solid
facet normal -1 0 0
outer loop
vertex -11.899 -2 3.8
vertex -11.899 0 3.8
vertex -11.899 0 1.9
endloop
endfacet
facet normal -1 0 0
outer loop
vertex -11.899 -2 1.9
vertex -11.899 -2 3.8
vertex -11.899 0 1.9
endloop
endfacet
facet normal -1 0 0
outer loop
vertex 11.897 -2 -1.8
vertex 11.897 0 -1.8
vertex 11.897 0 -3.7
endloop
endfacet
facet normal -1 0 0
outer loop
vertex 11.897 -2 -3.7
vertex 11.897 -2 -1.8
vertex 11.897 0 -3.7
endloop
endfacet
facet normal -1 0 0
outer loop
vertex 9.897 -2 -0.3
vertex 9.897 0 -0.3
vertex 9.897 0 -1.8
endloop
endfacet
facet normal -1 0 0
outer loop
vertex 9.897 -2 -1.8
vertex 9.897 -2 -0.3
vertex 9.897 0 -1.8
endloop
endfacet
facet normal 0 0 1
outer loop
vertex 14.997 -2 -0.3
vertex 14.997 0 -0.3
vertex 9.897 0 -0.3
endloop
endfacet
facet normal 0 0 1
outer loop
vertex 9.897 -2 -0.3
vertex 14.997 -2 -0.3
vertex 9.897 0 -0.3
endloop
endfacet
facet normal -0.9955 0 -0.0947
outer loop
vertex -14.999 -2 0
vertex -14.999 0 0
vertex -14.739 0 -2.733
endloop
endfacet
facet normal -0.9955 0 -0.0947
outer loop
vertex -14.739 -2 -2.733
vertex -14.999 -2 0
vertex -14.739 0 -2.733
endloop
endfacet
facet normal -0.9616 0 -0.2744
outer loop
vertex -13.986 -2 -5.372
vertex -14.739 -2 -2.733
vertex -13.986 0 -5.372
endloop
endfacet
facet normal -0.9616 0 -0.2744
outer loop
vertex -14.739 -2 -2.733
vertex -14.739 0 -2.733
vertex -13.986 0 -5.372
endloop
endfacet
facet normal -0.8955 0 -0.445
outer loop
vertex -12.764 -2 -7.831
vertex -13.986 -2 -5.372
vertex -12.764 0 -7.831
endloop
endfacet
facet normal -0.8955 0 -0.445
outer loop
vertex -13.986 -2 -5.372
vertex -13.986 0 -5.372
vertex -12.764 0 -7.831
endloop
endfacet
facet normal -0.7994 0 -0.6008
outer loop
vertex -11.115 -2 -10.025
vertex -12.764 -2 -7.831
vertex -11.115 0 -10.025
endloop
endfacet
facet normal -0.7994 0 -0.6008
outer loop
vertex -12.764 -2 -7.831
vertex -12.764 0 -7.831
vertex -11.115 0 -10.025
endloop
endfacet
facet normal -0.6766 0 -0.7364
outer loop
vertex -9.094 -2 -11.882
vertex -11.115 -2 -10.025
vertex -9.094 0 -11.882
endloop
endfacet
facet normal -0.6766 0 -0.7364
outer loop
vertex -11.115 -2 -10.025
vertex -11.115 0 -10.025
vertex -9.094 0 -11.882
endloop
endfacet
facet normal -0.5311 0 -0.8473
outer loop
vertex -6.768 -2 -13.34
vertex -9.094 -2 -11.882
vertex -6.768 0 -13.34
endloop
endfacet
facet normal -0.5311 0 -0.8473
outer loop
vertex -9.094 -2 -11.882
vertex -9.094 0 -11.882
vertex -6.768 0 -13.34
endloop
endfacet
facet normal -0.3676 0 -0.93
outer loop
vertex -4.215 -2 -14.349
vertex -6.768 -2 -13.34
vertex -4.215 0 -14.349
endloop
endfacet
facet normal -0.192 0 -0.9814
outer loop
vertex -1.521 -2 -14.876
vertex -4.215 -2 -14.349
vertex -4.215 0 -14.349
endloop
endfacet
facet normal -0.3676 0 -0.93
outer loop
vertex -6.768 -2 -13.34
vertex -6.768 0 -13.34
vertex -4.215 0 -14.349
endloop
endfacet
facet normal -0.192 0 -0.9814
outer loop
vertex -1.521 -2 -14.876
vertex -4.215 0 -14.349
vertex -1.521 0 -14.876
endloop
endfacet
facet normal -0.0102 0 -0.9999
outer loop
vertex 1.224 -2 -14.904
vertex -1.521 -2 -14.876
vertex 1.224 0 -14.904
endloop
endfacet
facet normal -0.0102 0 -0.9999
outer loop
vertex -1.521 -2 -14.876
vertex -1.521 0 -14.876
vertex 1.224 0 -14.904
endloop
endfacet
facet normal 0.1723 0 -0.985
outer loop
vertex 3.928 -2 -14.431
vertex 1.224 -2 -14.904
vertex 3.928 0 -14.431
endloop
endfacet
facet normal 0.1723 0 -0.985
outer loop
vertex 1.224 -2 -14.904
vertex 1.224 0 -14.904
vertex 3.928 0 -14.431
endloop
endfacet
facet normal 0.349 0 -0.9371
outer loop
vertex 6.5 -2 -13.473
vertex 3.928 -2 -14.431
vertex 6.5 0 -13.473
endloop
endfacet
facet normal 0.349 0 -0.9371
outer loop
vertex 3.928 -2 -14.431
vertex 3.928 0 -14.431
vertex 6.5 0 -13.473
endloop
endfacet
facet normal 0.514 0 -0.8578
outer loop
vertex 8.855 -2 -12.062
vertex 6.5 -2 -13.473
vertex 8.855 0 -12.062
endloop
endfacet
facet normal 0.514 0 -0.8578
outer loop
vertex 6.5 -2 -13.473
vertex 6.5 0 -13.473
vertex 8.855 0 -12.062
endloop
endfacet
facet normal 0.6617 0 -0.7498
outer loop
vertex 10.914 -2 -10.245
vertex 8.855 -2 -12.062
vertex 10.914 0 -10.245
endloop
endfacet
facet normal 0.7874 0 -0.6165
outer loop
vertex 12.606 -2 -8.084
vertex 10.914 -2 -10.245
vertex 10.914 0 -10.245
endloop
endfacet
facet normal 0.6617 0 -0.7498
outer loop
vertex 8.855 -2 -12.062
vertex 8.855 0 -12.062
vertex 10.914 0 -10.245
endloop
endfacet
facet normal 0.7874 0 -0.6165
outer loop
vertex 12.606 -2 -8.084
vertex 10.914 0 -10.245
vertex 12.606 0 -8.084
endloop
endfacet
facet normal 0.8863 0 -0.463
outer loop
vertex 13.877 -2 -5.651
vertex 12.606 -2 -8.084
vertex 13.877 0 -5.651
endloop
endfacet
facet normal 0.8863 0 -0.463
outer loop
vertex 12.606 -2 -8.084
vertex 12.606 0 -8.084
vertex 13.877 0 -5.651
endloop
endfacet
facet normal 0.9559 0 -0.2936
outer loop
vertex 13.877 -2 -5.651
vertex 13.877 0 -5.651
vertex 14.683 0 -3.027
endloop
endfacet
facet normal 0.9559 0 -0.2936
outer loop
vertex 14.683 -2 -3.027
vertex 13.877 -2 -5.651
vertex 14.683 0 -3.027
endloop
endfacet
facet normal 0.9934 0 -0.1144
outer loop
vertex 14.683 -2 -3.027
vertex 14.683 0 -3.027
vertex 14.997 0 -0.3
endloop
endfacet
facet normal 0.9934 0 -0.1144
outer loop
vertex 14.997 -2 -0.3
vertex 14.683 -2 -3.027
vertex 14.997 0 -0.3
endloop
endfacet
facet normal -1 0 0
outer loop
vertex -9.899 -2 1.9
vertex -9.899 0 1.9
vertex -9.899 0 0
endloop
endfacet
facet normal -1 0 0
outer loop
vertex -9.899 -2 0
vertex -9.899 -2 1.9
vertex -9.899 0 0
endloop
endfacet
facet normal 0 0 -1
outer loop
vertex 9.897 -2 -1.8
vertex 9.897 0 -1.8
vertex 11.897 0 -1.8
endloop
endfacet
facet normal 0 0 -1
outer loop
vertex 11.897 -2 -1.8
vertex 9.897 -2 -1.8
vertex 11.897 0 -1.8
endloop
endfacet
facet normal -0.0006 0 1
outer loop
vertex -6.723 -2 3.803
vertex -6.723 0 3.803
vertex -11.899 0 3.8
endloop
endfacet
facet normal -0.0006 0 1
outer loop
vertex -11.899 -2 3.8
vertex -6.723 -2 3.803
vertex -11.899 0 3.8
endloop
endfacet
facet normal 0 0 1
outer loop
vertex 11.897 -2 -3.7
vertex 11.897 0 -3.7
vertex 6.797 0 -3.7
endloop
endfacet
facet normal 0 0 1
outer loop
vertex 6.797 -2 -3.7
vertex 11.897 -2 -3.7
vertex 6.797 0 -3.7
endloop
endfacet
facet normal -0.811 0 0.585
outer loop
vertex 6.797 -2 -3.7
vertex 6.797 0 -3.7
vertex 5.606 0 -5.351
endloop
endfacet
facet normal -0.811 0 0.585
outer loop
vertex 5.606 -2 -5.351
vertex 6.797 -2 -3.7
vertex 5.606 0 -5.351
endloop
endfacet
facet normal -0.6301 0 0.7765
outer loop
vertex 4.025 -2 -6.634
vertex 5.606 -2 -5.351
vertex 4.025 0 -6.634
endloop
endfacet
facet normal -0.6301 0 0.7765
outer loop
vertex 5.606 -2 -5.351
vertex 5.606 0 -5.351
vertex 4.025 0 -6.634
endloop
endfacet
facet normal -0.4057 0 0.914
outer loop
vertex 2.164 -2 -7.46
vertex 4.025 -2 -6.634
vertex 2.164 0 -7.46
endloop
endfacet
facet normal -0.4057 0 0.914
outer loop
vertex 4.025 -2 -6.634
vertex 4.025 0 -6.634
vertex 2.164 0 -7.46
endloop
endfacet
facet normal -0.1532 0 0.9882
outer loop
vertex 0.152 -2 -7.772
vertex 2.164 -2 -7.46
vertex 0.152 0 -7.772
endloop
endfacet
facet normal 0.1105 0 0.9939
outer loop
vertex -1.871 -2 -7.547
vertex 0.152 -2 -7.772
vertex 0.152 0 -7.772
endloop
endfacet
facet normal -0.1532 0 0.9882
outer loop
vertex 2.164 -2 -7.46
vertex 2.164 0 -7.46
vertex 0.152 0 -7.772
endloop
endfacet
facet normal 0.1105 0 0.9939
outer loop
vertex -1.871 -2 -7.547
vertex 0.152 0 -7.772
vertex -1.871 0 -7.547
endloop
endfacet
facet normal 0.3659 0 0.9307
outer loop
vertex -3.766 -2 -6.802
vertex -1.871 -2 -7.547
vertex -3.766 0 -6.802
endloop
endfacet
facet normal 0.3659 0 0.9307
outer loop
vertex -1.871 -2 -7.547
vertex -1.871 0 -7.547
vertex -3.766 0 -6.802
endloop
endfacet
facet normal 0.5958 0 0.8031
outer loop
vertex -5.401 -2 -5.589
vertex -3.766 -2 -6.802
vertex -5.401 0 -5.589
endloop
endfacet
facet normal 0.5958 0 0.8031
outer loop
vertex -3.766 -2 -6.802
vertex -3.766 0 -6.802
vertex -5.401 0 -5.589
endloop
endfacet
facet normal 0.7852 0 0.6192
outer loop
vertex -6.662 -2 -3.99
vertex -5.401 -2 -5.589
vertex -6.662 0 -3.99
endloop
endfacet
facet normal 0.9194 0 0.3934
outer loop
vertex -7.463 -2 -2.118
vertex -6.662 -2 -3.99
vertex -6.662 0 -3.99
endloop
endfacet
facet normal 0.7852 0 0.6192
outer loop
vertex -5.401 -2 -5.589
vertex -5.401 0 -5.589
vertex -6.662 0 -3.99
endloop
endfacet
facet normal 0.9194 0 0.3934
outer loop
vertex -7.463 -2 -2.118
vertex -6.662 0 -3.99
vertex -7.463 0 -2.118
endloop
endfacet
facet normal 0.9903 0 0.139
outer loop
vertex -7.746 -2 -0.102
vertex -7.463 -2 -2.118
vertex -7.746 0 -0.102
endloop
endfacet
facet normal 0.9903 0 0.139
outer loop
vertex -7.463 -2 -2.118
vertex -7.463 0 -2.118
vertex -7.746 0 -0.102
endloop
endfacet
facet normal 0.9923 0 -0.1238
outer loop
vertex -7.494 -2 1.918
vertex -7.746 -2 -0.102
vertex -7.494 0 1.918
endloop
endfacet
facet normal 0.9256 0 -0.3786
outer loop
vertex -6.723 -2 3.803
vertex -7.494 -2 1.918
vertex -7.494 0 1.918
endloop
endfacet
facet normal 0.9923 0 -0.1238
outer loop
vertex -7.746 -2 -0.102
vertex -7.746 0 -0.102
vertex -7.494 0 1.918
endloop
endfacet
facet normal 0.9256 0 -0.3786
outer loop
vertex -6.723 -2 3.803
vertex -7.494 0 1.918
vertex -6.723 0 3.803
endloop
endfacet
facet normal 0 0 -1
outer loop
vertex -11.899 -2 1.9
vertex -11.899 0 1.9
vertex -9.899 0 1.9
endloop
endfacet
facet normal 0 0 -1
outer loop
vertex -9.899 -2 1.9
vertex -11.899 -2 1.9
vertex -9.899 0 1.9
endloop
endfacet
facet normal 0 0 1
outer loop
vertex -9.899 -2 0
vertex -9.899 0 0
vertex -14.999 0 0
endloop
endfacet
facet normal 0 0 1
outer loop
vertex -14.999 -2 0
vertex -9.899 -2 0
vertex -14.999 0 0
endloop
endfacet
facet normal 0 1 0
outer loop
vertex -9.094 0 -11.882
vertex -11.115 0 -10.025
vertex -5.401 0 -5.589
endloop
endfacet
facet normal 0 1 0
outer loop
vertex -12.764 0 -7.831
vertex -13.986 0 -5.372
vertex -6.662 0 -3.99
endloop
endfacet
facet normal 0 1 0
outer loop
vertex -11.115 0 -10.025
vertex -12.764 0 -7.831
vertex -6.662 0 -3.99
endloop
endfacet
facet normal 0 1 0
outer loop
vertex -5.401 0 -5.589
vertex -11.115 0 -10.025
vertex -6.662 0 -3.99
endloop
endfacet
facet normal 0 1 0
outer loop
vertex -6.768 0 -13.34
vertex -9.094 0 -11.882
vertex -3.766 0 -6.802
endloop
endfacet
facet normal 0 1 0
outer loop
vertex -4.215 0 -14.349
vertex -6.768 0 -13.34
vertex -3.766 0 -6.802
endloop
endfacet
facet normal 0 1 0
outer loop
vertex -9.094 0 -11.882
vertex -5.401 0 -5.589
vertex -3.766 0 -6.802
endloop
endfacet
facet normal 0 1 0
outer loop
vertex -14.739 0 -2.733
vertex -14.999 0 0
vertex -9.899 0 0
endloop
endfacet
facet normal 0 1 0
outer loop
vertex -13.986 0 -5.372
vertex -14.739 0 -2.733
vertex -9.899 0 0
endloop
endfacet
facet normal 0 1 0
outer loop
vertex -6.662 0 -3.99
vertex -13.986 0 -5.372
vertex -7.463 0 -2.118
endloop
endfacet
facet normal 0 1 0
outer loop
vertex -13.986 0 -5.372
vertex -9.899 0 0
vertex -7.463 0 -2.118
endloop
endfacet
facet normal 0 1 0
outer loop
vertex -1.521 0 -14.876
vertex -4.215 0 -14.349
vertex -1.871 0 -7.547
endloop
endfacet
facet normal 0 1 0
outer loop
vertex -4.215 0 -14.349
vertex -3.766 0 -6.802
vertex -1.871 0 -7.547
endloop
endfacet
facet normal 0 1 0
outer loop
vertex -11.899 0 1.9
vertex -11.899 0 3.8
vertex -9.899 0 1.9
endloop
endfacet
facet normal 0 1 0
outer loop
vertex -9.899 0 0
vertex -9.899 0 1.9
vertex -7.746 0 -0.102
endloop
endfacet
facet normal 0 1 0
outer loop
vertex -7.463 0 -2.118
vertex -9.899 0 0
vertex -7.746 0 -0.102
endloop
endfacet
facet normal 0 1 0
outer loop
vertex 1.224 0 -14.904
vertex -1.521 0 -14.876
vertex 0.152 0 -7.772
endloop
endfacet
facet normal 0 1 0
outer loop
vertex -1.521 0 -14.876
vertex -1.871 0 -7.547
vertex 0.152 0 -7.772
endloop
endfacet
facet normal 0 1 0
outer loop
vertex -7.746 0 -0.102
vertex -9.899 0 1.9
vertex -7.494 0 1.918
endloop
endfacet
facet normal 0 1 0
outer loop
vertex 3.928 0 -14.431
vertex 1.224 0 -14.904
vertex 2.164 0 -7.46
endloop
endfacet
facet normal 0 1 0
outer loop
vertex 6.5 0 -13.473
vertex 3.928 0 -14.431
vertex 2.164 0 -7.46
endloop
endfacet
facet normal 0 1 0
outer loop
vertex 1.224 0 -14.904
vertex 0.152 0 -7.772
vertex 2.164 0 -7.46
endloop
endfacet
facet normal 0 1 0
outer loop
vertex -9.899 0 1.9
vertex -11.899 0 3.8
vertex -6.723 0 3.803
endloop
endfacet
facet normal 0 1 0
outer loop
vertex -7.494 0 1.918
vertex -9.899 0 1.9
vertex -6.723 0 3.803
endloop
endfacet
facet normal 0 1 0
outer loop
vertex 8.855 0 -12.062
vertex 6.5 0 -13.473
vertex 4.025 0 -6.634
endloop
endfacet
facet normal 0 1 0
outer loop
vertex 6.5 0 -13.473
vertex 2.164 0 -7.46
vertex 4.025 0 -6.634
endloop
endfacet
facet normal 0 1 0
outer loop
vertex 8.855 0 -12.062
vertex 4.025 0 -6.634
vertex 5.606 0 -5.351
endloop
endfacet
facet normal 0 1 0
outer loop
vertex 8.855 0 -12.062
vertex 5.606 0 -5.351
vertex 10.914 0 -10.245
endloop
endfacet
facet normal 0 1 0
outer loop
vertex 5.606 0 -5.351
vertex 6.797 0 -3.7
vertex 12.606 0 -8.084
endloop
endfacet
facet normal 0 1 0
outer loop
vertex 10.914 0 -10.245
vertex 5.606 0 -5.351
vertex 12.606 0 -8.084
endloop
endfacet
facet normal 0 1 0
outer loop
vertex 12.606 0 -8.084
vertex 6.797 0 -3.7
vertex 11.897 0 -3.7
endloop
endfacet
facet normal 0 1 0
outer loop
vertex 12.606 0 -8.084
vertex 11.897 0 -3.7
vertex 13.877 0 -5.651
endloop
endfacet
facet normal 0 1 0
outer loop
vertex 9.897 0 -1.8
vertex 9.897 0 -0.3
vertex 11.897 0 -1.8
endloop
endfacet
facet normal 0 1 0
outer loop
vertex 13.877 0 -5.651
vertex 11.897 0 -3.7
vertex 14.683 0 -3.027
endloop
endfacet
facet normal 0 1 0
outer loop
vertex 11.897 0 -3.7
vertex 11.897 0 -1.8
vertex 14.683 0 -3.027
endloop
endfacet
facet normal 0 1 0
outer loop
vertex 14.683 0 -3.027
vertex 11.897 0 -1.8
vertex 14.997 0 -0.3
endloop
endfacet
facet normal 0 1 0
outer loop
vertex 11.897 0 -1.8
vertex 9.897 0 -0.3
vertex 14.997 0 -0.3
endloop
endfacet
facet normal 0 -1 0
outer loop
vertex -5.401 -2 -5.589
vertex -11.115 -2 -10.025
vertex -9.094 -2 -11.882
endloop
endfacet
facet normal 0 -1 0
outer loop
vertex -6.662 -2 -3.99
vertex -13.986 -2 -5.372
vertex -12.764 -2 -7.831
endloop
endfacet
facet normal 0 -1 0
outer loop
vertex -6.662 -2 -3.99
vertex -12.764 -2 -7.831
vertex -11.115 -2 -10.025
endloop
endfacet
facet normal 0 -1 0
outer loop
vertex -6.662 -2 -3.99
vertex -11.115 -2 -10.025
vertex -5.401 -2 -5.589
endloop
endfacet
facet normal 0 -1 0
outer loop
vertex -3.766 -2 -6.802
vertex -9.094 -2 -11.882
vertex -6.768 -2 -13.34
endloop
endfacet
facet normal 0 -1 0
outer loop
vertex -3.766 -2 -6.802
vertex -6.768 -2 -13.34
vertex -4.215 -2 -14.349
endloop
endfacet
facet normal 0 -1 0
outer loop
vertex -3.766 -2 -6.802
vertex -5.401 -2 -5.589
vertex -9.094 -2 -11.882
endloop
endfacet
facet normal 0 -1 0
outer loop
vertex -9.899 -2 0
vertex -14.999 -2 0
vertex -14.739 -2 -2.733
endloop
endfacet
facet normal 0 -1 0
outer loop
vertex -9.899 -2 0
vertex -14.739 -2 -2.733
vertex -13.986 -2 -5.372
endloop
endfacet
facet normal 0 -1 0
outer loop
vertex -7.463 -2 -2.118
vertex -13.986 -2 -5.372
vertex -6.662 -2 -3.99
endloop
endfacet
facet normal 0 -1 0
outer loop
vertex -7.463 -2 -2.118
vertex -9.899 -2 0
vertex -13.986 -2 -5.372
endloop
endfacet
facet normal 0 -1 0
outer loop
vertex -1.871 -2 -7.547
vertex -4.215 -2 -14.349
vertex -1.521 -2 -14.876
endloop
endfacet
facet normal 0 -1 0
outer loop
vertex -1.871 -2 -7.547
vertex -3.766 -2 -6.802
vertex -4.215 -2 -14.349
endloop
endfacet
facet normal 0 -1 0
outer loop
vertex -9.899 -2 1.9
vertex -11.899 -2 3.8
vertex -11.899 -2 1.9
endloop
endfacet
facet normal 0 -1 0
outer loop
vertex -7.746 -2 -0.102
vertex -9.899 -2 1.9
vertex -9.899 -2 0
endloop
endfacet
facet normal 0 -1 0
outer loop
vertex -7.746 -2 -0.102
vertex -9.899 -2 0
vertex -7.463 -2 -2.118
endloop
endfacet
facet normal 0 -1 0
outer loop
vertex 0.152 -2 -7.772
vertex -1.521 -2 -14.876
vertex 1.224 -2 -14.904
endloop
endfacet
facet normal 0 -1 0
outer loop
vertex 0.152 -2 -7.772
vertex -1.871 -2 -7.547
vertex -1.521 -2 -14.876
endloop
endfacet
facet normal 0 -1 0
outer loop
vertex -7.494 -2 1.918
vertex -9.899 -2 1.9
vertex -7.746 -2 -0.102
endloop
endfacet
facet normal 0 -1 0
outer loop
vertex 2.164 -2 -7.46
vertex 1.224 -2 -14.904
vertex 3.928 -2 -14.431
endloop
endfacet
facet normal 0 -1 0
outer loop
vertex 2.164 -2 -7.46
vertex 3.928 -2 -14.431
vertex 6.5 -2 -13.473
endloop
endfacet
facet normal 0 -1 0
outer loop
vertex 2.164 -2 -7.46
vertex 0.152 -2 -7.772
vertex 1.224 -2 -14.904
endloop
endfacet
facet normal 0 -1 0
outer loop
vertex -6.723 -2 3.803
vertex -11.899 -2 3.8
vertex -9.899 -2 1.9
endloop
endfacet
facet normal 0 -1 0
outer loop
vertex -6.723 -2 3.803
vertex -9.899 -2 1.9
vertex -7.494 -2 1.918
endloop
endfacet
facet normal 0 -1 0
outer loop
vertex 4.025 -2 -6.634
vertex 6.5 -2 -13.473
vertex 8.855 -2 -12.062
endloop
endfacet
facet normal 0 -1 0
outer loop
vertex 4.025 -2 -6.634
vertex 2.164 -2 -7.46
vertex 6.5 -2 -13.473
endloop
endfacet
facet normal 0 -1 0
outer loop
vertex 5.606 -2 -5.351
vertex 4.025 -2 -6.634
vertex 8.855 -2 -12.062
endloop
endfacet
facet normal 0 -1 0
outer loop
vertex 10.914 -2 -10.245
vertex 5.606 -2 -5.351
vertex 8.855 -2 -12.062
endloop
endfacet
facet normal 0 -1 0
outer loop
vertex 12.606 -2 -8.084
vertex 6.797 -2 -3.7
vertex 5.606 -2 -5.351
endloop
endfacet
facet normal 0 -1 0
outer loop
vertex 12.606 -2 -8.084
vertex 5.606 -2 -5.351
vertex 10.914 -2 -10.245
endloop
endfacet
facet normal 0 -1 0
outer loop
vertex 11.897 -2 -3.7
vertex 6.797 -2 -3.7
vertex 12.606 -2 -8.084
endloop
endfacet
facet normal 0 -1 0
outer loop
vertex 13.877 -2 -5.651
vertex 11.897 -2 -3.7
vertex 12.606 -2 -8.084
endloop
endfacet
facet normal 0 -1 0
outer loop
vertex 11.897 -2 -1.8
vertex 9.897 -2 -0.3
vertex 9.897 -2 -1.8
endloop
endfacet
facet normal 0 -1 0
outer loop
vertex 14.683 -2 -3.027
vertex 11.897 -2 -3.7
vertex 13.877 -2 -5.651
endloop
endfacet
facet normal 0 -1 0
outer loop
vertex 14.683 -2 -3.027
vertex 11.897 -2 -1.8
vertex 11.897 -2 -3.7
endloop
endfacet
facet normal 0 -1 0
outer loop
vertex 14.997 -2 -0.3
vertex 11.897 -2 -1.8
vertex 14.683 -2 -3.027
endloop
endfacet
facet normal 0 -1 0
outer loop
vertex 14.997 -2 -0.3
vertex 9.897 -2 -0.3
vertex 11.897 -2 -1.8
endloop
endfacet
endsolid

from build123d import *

# Parameters (mm, degrees)
F1_DEPTH = 2


with BuildPart() as f1:
    # F0 (on Front) → F1 (new body)
    with BuildSketch(Plane.XZ):
        with BuildLine():
            Line((-9.898934, 0), (-14.998934, 0))
            ThreePointArc((-14.998934, 0), (-0.149018, -14.953076), (14.997, -0.3))
            Line((14.997, -0.3), (9.897, -0.3))
            Line((9.897, -0.3), (9.897, -1.8))
            Line((9.897, -1.8), (11.897, -1.8))
            Line((11.897, -1.8), (11.897, -3.7))
            Line((11.897, -3.7), (6.797, -3.7))
            ThreePointArc((6.797, -3.7), (-3.766304, -6.802364), (-6.723454, 3.802508))
            Line((-6.723454, 3.802508), (-11.898934, 3.8))
            Line((-11.898934, 3.8), (-11.898934, 1.9))
            Line((-11.898934, 1.9), (-9.898934, 1.9))
            Line((-9.898934, 1.9), (-9.898934, 0))
        make_face()
    extrude(amount=F1_DEPTH)


solid = f1.part
